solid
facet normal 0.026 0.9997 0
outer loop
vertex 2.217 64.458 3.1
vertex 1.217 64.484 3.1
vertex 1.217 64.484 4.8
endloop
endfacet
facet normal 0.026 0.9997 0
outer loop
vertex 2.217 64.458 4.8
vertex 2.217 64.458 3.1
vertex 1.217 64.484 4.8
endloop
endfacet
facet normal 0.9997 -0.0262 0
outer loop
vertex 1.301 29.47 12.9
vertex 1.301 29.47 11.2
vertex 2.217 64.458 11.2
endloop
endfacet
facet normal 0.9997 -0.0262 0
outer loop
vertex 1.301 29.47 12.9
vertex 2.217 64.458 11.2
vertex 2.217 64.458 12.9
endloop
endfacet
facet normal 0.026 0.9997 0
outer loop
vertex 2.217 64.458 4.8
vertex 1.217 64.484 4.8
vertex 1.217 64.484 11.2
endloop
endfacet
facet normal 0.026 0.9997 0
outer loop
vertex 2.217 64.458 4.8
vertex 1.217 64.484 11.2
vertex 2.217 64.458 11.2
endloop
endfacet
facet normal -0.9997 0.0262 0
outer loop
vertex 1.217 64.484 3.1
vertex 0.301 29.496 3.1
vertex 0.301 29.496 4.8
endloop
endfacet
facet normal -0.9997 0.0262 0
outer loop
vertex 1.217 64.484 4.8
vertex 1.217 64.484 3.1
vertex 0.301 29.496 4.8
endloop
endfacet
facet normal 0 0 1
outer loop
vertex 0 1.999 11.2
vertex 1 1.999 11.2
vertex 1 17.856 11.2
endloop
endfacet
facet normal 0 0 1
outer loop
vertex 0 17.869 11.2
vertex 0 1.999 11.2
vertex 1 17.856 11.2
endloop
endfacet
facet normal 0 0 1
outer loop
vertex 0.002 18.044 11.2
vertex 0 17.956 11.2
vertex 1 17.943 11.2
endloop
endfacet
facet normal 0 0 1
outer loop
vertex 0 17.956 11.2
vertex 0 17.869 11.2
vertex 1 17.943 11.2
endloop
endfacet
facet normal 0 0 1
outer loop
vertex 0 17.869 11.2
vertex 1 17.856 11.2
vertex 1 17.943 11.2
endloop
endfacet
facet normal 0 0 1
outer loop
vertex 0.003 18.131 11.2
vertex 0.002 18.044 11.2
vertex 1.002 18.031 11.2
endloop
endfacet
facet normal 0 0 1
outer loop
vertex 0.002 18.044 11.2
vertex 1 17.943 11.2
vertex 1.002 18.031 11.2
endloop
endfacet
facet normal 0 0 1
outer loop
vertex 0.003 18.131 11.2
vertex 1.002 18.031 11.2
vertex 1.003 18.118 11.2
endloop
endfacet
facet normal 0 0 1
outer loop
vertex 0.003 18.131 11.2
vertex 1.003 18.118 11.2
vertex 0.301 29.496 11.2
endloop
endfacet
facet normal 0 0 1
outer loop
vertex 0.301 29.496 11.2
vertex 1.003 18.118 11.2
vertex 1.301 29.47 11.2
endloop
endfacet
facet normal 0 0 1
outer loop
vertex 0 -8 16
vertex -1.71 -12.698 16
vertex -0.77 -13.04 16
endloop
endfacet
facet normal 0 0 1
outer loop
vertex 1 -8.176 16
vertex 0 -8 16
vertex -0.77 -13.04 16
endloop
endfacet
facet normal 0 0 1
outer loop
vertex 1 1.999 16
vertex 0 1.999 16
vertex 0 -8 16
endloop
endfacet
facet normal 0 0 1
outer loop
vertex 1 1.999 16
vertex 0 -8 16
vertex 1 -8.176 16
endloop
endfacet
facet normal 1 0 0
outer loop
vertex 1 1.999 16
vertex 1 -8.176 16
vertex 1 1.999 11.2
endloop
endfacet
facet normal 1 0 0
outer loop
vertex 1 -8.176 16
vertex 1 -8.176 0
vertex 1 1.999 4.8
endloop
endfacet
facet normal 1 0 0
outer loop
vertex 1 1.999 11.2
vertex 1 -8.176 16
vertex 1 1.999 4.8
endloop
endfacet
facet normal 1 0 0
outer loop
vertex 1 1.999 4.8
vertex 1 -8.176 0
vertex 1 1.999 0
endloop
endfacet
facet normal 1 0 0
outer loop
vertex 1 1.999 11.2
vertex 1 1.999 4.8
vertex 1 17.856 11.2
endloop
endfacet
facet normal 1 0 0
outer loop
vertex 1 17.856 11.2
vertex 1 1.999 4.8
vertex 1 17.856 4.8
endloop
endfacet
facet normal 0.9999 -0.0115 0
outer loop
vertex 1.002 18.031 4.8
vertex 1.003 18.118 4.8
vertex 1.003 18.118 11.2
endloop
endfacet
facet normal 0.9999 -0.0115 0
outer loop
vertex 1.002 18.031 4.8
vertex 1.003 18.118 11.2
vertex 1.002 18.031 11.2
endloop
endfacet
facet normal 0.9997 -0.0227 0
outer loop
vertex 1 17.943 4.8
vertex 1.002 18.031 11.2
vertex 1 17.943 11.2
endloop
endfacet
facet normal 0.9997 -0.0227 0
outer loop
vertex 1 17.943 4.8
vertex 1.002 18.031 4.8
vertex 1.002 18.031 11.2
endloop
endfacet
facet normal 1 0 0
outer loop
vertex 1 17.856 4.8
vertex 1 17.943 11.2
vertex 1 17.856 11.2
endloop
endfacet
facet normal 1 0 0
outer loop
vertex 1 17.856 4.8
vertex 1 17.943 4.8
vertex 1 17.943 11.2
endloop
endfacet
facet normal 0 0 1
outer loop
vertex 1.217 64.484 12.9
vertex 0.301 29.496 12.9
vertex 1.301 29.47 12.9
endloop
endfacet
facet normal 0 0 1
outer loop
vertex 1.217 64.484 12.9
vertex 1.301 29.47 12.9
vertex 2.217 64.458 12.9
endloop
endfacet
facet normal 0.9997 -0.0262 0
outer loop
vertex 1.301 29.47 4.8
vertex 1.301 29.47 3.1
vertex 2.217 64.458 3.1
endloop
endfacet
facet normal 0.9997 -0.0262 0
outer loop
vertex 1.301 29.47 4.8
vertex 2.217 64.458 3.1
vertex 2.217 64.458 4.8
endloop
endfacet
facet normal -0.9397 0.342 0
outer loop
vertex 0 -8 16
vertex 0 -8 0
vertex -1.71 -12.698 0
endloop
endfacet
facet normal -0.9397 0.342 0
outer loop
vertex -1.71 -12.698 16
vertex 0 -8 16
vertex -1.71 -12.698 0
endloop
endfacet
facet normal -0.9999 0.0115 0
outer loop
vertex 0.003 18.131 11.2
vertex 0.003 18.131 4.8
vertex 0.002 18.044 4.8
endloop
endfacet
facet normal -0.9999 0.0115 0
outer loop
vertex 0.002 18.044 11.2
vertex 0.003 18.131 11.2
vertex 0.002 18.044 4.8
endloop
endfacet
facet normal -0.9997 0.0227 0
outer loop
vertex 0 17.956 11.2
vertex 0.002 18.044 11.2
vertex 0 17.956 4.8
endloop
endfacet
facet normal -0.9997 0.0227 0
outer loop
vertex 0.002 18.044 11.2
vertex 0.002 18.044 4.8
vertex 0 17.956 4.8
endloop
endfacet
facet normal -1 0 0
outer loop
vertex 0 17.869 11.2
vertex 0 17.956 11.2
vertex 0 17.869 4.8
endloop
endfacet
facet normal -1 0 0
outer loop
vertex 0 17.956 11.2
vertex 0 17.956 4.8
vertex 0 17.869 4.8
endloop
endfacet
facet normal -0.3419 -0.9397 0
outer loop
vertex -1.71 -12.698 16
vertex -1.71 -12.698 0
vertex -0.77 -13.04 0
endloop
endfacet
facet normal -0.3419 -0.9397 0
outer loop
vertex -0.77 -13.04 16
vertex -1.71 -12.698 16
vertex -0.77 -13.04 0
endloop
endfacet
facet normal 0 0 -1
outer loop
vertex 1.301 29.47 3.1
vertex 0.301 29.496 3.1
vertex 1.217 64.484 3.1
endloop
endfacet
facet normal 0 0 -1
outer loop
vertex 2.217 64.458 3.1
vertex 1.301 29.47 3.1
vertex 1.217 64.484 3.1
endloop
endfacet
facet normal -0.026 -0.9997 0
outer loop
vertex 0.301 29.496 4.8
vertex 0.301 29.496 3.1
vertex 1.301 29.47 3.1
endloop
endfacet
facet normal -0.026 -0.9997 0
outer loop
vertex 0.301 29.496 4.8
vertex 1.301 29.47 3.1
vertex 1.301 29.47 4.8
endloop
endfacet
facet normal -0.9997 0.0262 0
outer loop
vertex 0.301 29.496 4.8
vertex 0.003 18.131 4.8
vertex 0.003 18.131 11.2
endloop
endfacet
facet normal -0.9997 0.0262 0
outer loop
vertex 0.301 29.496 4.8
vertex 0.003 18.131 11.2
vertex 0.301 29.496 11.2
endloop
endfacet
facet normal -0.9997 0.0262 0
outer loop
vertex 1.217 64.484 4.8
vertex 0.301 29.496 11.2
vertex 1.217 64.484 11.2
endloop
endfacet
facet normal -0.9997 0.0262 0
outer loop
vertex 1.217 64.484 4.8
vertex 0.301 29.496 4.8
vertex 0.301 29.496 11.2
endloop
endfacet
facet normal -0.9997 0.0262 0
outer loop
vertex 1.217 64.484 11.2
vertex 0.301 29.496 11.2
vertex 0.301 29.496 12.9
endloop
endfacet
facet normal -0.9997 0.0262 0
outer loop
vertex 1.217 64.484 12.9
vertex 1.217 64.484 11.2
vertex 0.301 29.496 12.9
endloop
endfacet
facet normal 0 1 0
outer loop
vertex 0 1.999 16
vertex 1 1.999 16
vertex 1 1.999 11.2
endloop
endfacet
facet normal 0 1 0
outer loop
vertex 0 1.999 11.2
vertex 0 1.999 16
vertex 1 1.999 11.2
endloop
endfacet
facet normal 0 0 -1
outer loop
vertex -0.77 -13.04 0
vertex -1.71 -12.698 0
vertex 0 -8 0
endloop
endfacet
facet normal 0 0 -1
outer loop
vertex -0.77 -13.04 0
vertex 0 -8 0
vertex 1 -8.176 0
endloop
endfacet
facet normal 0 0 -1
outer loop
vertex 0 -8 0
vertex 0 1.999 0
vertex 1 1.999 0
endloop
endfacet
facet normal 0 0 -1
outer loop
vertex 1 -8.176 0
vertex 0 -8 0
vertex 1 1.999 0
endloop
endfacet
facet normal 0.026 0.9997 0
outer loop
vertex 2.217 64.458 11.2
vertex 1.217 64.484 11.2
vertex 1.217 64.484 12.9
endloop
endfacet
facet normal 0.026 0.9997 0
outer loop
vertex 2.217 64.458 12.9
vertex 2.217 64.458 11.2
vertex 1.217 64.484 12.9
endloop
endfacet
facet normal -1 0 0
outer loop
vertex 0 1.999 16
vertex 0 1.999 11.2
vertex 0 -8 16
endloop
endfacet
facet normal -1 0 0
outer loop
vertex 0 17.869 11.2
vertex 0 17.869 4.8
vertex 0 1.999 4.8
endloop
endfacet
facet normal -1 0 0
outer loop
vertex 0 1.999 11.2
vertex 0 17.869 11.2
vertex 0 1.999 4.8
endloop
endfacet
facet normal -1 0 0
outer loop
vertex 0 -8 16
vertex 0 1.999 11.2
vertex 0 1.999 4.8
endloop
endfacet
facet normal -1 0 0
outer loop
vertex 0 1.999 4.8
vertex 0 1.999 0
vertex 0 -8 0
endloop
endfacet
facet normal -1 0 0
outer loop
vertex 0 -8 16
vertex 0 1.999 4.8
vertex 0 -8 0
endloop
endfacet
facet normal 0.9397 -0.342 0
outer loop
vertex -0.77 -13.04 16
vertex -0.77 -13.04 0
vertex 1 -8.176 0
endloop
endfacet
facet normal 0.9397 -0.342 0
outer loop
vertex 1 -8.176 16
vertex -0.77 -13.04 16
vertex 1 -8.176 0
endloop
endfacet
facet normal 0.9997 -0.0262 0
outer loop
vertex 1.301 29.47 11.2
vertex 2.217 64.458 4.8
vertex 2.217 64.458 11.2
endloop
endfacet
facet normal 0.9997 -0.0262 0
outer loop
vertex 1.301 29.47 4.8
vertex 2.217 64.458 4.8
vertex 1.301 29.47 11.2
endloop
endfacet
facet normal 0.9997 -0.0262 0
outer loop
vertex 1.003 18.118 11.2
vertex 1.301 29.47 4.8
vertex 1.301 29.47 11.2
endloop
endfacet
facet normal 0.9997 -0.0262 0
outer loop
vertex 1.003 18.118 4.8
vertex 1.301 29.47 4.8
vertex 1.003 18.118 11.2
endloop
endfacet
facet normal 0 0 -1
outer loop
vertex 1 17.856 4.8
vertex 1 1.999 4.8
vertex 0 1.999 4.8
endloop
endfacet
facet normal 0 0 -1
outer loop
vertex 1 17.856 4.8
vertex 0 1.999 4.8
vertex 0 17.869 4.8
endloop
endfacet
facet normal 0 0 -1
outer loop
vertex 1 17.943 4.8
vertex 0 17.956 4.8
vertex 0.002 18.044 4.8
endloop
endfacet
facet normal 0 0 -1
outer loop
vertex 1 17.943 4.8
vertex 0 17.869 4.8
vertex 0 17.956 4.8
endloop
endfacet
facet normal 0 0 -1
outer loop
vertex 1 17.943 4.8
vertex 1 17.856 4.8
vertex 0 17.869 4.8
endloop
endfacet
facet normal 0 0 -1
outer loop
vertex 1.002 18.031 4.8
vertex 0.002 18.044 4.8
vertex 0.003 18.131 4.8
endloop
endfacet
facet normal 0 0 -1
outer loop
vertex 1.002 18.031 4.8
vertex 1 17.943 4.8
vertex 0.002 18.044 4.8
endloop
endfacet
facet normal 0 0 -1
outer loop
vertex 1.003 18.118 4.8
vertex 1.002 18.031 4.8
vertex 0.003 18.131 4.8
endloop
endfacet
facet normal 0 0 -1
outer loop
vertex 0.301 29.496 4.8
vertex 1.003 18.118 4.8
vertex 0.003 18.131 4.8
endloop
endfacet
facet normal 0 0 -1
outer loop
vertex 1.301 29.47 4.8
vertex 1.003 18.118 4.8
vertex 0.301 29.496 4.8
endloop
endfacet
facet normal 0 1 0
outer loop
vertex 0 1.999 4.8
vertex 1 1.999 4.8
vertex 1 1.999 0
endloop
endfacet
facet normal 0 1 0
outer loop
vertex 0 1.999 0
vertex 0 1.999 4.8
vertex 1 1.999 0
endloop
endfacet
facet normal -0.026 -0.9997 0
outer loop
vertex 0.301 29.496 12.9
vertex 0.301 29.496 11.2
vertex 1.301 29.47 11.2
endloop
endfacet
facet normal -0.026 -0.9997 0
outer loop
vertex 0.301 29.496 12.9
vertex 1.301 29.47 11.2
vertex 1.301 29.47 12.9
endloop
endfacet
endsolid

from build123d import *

# Parameters (mm, degrees)
EXTRUDE_2_DEPTH      = 16
SKETCH_31_W          = 4.8
SKETCH_31_H          = 46.486909283
CUT_EXTRUDE_6_DEPTH  = 67.474283586
SKETCH_32_W          = 4.8
SKETCH_32_H          = 14.308405558
CUT_EXTRUDE_7_DEPTH  = 16
FILLET_1_R           = 10
FILLET_2_R           = 10
SKETCH_39_W          = 1.7
SKETCH_39_H          = 35
EXTRUDE_1_DEPTH      = 1
SKETCH_40_W          = 1
SKETCH_40_H          = 4.8
CUT_EXTRUDE_8_DEPTH  = 10
SKETCH_41_W          = 3.264842031
SKETCH_41_H          = 6.457557915
CUT_EXTRUDE_9_DEPTH  = 10
SKETCH_42_W          = 4.8
SKETCH_42_H          = 1.68
CUT_EXTRUDE_10_DEPTH = 10
EXTRUDE_3_DEPTH      = 16


with BuildPart() as part:
    # 草图28 → 拉伸-薄壁2 (new body)
    with BuildSketch(Plane.XY):
        Polygon((0, 0), (0, 18), (1.217228096, 64.484065611), (2.216885421, 64.457888663), (1, 17.986909283), (1, 0), align=None)
    extrude(amount=EXTRUDE_2_DEPTH)

    # 草图31 → 切除-拉伸6 (cut, through all)
    with BuildSketch(Plane(origin=(0.528633719, -0.013842761, 0), x_dir=(0, 0, -1), z_dir=(0.9996573249755574, -0.02617694830787331, 0))):
        with Locations((-13.6, 41.250377209)):
            Rectangle(SKETCH_31_W, SKETCH_31_H)
        with Locations((-2.4, 41.250377209)):
            Rectangle(SKETCH_31_W, SKETCH_31_H)
    extrude(amount=-CUT_EXTRUDE_6_DEPTH, mode=Mode.SUBTRACT)

    # 草图32 → 切除-拉伸7 (cut)
    with BuildSketch(Plane(origin=(1, 0, 0), x_dir=(0, 0, -1), z_dir=(1, 0, 0))):
        with Locations((-13.6, 10.832706504)):
            Rectangle(SKETCH_32_W, SKETCH_32_H)
        with Locations((-2.4, 10.832706504)):
            Rectangle(SKETCH_32_W, SKETCH_32_H)
    extrude(amount=-CUT_EXTRUDE_7_DEPTH, mode=Mode.SUBTRACT)

    # 圆角1
    # the kernel refuses this fillet: 10 mm, written as the material it takes off along each edge
    with BuildSketch(Plane(origin=(0, 18, -0.327267927), x_dir=(0, -1, 0), z_dir=(0, 0, 1))) as fillet_1_piece_1:
        with BuildLine():
            CenterArc((FILLET_1_R * 0.0130907170848, FILLET_1_R), FILLET_1_R, 268.5, 1.5)
            Line((-FILLET_1_R * 0.013086231223, FILLET_1_R * 0.000342675024443), (0, 0))
            Line((0, 0), (FILLET_1_R * 0.0130907170848, 0))
        make_face()
    extrude(amount=16.654535854, mode=Mode.SUBTRACT)

    # 圆角2
    # the kernel refuses this fillet: 10 mm, written as the material it adds along each edge
    with BuildSketch(Plane(origin=(1, 17.986909283, 4.8), x_dir=(0, -1, 0), z_dir=(0, 0, 1))) as fillet_2_piece_1:
        with BuildLine():
            CenterArc((FILLET_2_R * 0.0130907170848, FILLET_2_R), FILLET_2_R, 268.5, 1.5)
            Line((-FILLET_2_R * 0.013086231223, FILLET_2_R * 0.000342675024443), (0, 0))
            Line((0, 0), (FILLET_2_R * 0.0130907170848, 0))
        make_face()
    extrude(amount=6.4)

    # 草图39 → 凸台-拉伸1 (add)
    with BuildSketch(Plane(origin=(-0.471023606, 0.012334187, 0), x_dir=(0, 0, 1), z_dir=(-0.9996573249755574, 0.026176948307873305, 0))):
        with Locations((12.05, 46.99383185)):
            Rectangle(SKETCH_39_W, SKETCH_39_H)
        with Locations((3.95, 46.99383185)):
            Rectangle(SKETCH_39_W, SKETCH_39_H)
    extrude(amount=-EXTRUDE_1_DEPTH)

    # 草图40 → 切除-拉伸8 (cut)
    with BuildSketch(Plane(origin=(0.471366281, 18.000752044, 0), x_dir=(0.9996573249755574, -0.02617694830787331, 0), z_dir=(0.02617694830787331, 0.9996573249755574, 0))):
        with Locations((0.02881493, -13.6)):
            Rectangle(SKETCH_40_W, SKETCH_40_H)
    extrude(amount=-CUT_EXTRUDE_8_DEPTH, mode=Mode.SUBTRACT)

    # 草图41 → 切除-拉伸9 (cut)
    with BuildSketch(Plane(origin=(0.471366281, 18.000752044, 0), x_dir=(0.9996573249755574, -0.02617694830787331, 0), z_dir=(0.02617694830787331, 0.9996573249755574, 0))):
        with Locations((-1.103606086, -1.571221043)):
            Rectangle(SKETCH_41_W, SKETCH_41_H)
    extrude(amount=-CUT_EXTRUDE_9_DEPTH, mode=Mode.SUBTRACT)

    # 草图42 → 切除-拉伸10 (cut)
    with BuildSketch(Plane(origin=(1, 0, 0), x_dir=(0, 0, -1), z_dir=(1, 0, 0))):
        with Locations((-2.4, 2.838503725)):
            Rectangle(SKETCH_42_W, SKETCH_42_H)
        with Locations((-13.6, 2.838503725)):
            Rectangle(SKETCH_42_W, SKETCH_42_H)
    extrude(amount=-CUT_EXTRUDE_10_DEPTH, mode=Mode.SUBTRACT)

    # 草图44 → 拉伸-薄壁3 (add)
    with BuildSketch(Plane(origin=(0, 0, 0), x_dir=(-1, 0, 0), z_dir=(0, 0, -1))):
        Polygon((0, 0), (0, -8), (1.710100717, -12.698463104), (0.770408096, -13.040483247), (-1, -8.176326981), (-1, 0), align=None)
    extrude(amount=-EXTRUDE_3_DEPTH)


solid = part.part
